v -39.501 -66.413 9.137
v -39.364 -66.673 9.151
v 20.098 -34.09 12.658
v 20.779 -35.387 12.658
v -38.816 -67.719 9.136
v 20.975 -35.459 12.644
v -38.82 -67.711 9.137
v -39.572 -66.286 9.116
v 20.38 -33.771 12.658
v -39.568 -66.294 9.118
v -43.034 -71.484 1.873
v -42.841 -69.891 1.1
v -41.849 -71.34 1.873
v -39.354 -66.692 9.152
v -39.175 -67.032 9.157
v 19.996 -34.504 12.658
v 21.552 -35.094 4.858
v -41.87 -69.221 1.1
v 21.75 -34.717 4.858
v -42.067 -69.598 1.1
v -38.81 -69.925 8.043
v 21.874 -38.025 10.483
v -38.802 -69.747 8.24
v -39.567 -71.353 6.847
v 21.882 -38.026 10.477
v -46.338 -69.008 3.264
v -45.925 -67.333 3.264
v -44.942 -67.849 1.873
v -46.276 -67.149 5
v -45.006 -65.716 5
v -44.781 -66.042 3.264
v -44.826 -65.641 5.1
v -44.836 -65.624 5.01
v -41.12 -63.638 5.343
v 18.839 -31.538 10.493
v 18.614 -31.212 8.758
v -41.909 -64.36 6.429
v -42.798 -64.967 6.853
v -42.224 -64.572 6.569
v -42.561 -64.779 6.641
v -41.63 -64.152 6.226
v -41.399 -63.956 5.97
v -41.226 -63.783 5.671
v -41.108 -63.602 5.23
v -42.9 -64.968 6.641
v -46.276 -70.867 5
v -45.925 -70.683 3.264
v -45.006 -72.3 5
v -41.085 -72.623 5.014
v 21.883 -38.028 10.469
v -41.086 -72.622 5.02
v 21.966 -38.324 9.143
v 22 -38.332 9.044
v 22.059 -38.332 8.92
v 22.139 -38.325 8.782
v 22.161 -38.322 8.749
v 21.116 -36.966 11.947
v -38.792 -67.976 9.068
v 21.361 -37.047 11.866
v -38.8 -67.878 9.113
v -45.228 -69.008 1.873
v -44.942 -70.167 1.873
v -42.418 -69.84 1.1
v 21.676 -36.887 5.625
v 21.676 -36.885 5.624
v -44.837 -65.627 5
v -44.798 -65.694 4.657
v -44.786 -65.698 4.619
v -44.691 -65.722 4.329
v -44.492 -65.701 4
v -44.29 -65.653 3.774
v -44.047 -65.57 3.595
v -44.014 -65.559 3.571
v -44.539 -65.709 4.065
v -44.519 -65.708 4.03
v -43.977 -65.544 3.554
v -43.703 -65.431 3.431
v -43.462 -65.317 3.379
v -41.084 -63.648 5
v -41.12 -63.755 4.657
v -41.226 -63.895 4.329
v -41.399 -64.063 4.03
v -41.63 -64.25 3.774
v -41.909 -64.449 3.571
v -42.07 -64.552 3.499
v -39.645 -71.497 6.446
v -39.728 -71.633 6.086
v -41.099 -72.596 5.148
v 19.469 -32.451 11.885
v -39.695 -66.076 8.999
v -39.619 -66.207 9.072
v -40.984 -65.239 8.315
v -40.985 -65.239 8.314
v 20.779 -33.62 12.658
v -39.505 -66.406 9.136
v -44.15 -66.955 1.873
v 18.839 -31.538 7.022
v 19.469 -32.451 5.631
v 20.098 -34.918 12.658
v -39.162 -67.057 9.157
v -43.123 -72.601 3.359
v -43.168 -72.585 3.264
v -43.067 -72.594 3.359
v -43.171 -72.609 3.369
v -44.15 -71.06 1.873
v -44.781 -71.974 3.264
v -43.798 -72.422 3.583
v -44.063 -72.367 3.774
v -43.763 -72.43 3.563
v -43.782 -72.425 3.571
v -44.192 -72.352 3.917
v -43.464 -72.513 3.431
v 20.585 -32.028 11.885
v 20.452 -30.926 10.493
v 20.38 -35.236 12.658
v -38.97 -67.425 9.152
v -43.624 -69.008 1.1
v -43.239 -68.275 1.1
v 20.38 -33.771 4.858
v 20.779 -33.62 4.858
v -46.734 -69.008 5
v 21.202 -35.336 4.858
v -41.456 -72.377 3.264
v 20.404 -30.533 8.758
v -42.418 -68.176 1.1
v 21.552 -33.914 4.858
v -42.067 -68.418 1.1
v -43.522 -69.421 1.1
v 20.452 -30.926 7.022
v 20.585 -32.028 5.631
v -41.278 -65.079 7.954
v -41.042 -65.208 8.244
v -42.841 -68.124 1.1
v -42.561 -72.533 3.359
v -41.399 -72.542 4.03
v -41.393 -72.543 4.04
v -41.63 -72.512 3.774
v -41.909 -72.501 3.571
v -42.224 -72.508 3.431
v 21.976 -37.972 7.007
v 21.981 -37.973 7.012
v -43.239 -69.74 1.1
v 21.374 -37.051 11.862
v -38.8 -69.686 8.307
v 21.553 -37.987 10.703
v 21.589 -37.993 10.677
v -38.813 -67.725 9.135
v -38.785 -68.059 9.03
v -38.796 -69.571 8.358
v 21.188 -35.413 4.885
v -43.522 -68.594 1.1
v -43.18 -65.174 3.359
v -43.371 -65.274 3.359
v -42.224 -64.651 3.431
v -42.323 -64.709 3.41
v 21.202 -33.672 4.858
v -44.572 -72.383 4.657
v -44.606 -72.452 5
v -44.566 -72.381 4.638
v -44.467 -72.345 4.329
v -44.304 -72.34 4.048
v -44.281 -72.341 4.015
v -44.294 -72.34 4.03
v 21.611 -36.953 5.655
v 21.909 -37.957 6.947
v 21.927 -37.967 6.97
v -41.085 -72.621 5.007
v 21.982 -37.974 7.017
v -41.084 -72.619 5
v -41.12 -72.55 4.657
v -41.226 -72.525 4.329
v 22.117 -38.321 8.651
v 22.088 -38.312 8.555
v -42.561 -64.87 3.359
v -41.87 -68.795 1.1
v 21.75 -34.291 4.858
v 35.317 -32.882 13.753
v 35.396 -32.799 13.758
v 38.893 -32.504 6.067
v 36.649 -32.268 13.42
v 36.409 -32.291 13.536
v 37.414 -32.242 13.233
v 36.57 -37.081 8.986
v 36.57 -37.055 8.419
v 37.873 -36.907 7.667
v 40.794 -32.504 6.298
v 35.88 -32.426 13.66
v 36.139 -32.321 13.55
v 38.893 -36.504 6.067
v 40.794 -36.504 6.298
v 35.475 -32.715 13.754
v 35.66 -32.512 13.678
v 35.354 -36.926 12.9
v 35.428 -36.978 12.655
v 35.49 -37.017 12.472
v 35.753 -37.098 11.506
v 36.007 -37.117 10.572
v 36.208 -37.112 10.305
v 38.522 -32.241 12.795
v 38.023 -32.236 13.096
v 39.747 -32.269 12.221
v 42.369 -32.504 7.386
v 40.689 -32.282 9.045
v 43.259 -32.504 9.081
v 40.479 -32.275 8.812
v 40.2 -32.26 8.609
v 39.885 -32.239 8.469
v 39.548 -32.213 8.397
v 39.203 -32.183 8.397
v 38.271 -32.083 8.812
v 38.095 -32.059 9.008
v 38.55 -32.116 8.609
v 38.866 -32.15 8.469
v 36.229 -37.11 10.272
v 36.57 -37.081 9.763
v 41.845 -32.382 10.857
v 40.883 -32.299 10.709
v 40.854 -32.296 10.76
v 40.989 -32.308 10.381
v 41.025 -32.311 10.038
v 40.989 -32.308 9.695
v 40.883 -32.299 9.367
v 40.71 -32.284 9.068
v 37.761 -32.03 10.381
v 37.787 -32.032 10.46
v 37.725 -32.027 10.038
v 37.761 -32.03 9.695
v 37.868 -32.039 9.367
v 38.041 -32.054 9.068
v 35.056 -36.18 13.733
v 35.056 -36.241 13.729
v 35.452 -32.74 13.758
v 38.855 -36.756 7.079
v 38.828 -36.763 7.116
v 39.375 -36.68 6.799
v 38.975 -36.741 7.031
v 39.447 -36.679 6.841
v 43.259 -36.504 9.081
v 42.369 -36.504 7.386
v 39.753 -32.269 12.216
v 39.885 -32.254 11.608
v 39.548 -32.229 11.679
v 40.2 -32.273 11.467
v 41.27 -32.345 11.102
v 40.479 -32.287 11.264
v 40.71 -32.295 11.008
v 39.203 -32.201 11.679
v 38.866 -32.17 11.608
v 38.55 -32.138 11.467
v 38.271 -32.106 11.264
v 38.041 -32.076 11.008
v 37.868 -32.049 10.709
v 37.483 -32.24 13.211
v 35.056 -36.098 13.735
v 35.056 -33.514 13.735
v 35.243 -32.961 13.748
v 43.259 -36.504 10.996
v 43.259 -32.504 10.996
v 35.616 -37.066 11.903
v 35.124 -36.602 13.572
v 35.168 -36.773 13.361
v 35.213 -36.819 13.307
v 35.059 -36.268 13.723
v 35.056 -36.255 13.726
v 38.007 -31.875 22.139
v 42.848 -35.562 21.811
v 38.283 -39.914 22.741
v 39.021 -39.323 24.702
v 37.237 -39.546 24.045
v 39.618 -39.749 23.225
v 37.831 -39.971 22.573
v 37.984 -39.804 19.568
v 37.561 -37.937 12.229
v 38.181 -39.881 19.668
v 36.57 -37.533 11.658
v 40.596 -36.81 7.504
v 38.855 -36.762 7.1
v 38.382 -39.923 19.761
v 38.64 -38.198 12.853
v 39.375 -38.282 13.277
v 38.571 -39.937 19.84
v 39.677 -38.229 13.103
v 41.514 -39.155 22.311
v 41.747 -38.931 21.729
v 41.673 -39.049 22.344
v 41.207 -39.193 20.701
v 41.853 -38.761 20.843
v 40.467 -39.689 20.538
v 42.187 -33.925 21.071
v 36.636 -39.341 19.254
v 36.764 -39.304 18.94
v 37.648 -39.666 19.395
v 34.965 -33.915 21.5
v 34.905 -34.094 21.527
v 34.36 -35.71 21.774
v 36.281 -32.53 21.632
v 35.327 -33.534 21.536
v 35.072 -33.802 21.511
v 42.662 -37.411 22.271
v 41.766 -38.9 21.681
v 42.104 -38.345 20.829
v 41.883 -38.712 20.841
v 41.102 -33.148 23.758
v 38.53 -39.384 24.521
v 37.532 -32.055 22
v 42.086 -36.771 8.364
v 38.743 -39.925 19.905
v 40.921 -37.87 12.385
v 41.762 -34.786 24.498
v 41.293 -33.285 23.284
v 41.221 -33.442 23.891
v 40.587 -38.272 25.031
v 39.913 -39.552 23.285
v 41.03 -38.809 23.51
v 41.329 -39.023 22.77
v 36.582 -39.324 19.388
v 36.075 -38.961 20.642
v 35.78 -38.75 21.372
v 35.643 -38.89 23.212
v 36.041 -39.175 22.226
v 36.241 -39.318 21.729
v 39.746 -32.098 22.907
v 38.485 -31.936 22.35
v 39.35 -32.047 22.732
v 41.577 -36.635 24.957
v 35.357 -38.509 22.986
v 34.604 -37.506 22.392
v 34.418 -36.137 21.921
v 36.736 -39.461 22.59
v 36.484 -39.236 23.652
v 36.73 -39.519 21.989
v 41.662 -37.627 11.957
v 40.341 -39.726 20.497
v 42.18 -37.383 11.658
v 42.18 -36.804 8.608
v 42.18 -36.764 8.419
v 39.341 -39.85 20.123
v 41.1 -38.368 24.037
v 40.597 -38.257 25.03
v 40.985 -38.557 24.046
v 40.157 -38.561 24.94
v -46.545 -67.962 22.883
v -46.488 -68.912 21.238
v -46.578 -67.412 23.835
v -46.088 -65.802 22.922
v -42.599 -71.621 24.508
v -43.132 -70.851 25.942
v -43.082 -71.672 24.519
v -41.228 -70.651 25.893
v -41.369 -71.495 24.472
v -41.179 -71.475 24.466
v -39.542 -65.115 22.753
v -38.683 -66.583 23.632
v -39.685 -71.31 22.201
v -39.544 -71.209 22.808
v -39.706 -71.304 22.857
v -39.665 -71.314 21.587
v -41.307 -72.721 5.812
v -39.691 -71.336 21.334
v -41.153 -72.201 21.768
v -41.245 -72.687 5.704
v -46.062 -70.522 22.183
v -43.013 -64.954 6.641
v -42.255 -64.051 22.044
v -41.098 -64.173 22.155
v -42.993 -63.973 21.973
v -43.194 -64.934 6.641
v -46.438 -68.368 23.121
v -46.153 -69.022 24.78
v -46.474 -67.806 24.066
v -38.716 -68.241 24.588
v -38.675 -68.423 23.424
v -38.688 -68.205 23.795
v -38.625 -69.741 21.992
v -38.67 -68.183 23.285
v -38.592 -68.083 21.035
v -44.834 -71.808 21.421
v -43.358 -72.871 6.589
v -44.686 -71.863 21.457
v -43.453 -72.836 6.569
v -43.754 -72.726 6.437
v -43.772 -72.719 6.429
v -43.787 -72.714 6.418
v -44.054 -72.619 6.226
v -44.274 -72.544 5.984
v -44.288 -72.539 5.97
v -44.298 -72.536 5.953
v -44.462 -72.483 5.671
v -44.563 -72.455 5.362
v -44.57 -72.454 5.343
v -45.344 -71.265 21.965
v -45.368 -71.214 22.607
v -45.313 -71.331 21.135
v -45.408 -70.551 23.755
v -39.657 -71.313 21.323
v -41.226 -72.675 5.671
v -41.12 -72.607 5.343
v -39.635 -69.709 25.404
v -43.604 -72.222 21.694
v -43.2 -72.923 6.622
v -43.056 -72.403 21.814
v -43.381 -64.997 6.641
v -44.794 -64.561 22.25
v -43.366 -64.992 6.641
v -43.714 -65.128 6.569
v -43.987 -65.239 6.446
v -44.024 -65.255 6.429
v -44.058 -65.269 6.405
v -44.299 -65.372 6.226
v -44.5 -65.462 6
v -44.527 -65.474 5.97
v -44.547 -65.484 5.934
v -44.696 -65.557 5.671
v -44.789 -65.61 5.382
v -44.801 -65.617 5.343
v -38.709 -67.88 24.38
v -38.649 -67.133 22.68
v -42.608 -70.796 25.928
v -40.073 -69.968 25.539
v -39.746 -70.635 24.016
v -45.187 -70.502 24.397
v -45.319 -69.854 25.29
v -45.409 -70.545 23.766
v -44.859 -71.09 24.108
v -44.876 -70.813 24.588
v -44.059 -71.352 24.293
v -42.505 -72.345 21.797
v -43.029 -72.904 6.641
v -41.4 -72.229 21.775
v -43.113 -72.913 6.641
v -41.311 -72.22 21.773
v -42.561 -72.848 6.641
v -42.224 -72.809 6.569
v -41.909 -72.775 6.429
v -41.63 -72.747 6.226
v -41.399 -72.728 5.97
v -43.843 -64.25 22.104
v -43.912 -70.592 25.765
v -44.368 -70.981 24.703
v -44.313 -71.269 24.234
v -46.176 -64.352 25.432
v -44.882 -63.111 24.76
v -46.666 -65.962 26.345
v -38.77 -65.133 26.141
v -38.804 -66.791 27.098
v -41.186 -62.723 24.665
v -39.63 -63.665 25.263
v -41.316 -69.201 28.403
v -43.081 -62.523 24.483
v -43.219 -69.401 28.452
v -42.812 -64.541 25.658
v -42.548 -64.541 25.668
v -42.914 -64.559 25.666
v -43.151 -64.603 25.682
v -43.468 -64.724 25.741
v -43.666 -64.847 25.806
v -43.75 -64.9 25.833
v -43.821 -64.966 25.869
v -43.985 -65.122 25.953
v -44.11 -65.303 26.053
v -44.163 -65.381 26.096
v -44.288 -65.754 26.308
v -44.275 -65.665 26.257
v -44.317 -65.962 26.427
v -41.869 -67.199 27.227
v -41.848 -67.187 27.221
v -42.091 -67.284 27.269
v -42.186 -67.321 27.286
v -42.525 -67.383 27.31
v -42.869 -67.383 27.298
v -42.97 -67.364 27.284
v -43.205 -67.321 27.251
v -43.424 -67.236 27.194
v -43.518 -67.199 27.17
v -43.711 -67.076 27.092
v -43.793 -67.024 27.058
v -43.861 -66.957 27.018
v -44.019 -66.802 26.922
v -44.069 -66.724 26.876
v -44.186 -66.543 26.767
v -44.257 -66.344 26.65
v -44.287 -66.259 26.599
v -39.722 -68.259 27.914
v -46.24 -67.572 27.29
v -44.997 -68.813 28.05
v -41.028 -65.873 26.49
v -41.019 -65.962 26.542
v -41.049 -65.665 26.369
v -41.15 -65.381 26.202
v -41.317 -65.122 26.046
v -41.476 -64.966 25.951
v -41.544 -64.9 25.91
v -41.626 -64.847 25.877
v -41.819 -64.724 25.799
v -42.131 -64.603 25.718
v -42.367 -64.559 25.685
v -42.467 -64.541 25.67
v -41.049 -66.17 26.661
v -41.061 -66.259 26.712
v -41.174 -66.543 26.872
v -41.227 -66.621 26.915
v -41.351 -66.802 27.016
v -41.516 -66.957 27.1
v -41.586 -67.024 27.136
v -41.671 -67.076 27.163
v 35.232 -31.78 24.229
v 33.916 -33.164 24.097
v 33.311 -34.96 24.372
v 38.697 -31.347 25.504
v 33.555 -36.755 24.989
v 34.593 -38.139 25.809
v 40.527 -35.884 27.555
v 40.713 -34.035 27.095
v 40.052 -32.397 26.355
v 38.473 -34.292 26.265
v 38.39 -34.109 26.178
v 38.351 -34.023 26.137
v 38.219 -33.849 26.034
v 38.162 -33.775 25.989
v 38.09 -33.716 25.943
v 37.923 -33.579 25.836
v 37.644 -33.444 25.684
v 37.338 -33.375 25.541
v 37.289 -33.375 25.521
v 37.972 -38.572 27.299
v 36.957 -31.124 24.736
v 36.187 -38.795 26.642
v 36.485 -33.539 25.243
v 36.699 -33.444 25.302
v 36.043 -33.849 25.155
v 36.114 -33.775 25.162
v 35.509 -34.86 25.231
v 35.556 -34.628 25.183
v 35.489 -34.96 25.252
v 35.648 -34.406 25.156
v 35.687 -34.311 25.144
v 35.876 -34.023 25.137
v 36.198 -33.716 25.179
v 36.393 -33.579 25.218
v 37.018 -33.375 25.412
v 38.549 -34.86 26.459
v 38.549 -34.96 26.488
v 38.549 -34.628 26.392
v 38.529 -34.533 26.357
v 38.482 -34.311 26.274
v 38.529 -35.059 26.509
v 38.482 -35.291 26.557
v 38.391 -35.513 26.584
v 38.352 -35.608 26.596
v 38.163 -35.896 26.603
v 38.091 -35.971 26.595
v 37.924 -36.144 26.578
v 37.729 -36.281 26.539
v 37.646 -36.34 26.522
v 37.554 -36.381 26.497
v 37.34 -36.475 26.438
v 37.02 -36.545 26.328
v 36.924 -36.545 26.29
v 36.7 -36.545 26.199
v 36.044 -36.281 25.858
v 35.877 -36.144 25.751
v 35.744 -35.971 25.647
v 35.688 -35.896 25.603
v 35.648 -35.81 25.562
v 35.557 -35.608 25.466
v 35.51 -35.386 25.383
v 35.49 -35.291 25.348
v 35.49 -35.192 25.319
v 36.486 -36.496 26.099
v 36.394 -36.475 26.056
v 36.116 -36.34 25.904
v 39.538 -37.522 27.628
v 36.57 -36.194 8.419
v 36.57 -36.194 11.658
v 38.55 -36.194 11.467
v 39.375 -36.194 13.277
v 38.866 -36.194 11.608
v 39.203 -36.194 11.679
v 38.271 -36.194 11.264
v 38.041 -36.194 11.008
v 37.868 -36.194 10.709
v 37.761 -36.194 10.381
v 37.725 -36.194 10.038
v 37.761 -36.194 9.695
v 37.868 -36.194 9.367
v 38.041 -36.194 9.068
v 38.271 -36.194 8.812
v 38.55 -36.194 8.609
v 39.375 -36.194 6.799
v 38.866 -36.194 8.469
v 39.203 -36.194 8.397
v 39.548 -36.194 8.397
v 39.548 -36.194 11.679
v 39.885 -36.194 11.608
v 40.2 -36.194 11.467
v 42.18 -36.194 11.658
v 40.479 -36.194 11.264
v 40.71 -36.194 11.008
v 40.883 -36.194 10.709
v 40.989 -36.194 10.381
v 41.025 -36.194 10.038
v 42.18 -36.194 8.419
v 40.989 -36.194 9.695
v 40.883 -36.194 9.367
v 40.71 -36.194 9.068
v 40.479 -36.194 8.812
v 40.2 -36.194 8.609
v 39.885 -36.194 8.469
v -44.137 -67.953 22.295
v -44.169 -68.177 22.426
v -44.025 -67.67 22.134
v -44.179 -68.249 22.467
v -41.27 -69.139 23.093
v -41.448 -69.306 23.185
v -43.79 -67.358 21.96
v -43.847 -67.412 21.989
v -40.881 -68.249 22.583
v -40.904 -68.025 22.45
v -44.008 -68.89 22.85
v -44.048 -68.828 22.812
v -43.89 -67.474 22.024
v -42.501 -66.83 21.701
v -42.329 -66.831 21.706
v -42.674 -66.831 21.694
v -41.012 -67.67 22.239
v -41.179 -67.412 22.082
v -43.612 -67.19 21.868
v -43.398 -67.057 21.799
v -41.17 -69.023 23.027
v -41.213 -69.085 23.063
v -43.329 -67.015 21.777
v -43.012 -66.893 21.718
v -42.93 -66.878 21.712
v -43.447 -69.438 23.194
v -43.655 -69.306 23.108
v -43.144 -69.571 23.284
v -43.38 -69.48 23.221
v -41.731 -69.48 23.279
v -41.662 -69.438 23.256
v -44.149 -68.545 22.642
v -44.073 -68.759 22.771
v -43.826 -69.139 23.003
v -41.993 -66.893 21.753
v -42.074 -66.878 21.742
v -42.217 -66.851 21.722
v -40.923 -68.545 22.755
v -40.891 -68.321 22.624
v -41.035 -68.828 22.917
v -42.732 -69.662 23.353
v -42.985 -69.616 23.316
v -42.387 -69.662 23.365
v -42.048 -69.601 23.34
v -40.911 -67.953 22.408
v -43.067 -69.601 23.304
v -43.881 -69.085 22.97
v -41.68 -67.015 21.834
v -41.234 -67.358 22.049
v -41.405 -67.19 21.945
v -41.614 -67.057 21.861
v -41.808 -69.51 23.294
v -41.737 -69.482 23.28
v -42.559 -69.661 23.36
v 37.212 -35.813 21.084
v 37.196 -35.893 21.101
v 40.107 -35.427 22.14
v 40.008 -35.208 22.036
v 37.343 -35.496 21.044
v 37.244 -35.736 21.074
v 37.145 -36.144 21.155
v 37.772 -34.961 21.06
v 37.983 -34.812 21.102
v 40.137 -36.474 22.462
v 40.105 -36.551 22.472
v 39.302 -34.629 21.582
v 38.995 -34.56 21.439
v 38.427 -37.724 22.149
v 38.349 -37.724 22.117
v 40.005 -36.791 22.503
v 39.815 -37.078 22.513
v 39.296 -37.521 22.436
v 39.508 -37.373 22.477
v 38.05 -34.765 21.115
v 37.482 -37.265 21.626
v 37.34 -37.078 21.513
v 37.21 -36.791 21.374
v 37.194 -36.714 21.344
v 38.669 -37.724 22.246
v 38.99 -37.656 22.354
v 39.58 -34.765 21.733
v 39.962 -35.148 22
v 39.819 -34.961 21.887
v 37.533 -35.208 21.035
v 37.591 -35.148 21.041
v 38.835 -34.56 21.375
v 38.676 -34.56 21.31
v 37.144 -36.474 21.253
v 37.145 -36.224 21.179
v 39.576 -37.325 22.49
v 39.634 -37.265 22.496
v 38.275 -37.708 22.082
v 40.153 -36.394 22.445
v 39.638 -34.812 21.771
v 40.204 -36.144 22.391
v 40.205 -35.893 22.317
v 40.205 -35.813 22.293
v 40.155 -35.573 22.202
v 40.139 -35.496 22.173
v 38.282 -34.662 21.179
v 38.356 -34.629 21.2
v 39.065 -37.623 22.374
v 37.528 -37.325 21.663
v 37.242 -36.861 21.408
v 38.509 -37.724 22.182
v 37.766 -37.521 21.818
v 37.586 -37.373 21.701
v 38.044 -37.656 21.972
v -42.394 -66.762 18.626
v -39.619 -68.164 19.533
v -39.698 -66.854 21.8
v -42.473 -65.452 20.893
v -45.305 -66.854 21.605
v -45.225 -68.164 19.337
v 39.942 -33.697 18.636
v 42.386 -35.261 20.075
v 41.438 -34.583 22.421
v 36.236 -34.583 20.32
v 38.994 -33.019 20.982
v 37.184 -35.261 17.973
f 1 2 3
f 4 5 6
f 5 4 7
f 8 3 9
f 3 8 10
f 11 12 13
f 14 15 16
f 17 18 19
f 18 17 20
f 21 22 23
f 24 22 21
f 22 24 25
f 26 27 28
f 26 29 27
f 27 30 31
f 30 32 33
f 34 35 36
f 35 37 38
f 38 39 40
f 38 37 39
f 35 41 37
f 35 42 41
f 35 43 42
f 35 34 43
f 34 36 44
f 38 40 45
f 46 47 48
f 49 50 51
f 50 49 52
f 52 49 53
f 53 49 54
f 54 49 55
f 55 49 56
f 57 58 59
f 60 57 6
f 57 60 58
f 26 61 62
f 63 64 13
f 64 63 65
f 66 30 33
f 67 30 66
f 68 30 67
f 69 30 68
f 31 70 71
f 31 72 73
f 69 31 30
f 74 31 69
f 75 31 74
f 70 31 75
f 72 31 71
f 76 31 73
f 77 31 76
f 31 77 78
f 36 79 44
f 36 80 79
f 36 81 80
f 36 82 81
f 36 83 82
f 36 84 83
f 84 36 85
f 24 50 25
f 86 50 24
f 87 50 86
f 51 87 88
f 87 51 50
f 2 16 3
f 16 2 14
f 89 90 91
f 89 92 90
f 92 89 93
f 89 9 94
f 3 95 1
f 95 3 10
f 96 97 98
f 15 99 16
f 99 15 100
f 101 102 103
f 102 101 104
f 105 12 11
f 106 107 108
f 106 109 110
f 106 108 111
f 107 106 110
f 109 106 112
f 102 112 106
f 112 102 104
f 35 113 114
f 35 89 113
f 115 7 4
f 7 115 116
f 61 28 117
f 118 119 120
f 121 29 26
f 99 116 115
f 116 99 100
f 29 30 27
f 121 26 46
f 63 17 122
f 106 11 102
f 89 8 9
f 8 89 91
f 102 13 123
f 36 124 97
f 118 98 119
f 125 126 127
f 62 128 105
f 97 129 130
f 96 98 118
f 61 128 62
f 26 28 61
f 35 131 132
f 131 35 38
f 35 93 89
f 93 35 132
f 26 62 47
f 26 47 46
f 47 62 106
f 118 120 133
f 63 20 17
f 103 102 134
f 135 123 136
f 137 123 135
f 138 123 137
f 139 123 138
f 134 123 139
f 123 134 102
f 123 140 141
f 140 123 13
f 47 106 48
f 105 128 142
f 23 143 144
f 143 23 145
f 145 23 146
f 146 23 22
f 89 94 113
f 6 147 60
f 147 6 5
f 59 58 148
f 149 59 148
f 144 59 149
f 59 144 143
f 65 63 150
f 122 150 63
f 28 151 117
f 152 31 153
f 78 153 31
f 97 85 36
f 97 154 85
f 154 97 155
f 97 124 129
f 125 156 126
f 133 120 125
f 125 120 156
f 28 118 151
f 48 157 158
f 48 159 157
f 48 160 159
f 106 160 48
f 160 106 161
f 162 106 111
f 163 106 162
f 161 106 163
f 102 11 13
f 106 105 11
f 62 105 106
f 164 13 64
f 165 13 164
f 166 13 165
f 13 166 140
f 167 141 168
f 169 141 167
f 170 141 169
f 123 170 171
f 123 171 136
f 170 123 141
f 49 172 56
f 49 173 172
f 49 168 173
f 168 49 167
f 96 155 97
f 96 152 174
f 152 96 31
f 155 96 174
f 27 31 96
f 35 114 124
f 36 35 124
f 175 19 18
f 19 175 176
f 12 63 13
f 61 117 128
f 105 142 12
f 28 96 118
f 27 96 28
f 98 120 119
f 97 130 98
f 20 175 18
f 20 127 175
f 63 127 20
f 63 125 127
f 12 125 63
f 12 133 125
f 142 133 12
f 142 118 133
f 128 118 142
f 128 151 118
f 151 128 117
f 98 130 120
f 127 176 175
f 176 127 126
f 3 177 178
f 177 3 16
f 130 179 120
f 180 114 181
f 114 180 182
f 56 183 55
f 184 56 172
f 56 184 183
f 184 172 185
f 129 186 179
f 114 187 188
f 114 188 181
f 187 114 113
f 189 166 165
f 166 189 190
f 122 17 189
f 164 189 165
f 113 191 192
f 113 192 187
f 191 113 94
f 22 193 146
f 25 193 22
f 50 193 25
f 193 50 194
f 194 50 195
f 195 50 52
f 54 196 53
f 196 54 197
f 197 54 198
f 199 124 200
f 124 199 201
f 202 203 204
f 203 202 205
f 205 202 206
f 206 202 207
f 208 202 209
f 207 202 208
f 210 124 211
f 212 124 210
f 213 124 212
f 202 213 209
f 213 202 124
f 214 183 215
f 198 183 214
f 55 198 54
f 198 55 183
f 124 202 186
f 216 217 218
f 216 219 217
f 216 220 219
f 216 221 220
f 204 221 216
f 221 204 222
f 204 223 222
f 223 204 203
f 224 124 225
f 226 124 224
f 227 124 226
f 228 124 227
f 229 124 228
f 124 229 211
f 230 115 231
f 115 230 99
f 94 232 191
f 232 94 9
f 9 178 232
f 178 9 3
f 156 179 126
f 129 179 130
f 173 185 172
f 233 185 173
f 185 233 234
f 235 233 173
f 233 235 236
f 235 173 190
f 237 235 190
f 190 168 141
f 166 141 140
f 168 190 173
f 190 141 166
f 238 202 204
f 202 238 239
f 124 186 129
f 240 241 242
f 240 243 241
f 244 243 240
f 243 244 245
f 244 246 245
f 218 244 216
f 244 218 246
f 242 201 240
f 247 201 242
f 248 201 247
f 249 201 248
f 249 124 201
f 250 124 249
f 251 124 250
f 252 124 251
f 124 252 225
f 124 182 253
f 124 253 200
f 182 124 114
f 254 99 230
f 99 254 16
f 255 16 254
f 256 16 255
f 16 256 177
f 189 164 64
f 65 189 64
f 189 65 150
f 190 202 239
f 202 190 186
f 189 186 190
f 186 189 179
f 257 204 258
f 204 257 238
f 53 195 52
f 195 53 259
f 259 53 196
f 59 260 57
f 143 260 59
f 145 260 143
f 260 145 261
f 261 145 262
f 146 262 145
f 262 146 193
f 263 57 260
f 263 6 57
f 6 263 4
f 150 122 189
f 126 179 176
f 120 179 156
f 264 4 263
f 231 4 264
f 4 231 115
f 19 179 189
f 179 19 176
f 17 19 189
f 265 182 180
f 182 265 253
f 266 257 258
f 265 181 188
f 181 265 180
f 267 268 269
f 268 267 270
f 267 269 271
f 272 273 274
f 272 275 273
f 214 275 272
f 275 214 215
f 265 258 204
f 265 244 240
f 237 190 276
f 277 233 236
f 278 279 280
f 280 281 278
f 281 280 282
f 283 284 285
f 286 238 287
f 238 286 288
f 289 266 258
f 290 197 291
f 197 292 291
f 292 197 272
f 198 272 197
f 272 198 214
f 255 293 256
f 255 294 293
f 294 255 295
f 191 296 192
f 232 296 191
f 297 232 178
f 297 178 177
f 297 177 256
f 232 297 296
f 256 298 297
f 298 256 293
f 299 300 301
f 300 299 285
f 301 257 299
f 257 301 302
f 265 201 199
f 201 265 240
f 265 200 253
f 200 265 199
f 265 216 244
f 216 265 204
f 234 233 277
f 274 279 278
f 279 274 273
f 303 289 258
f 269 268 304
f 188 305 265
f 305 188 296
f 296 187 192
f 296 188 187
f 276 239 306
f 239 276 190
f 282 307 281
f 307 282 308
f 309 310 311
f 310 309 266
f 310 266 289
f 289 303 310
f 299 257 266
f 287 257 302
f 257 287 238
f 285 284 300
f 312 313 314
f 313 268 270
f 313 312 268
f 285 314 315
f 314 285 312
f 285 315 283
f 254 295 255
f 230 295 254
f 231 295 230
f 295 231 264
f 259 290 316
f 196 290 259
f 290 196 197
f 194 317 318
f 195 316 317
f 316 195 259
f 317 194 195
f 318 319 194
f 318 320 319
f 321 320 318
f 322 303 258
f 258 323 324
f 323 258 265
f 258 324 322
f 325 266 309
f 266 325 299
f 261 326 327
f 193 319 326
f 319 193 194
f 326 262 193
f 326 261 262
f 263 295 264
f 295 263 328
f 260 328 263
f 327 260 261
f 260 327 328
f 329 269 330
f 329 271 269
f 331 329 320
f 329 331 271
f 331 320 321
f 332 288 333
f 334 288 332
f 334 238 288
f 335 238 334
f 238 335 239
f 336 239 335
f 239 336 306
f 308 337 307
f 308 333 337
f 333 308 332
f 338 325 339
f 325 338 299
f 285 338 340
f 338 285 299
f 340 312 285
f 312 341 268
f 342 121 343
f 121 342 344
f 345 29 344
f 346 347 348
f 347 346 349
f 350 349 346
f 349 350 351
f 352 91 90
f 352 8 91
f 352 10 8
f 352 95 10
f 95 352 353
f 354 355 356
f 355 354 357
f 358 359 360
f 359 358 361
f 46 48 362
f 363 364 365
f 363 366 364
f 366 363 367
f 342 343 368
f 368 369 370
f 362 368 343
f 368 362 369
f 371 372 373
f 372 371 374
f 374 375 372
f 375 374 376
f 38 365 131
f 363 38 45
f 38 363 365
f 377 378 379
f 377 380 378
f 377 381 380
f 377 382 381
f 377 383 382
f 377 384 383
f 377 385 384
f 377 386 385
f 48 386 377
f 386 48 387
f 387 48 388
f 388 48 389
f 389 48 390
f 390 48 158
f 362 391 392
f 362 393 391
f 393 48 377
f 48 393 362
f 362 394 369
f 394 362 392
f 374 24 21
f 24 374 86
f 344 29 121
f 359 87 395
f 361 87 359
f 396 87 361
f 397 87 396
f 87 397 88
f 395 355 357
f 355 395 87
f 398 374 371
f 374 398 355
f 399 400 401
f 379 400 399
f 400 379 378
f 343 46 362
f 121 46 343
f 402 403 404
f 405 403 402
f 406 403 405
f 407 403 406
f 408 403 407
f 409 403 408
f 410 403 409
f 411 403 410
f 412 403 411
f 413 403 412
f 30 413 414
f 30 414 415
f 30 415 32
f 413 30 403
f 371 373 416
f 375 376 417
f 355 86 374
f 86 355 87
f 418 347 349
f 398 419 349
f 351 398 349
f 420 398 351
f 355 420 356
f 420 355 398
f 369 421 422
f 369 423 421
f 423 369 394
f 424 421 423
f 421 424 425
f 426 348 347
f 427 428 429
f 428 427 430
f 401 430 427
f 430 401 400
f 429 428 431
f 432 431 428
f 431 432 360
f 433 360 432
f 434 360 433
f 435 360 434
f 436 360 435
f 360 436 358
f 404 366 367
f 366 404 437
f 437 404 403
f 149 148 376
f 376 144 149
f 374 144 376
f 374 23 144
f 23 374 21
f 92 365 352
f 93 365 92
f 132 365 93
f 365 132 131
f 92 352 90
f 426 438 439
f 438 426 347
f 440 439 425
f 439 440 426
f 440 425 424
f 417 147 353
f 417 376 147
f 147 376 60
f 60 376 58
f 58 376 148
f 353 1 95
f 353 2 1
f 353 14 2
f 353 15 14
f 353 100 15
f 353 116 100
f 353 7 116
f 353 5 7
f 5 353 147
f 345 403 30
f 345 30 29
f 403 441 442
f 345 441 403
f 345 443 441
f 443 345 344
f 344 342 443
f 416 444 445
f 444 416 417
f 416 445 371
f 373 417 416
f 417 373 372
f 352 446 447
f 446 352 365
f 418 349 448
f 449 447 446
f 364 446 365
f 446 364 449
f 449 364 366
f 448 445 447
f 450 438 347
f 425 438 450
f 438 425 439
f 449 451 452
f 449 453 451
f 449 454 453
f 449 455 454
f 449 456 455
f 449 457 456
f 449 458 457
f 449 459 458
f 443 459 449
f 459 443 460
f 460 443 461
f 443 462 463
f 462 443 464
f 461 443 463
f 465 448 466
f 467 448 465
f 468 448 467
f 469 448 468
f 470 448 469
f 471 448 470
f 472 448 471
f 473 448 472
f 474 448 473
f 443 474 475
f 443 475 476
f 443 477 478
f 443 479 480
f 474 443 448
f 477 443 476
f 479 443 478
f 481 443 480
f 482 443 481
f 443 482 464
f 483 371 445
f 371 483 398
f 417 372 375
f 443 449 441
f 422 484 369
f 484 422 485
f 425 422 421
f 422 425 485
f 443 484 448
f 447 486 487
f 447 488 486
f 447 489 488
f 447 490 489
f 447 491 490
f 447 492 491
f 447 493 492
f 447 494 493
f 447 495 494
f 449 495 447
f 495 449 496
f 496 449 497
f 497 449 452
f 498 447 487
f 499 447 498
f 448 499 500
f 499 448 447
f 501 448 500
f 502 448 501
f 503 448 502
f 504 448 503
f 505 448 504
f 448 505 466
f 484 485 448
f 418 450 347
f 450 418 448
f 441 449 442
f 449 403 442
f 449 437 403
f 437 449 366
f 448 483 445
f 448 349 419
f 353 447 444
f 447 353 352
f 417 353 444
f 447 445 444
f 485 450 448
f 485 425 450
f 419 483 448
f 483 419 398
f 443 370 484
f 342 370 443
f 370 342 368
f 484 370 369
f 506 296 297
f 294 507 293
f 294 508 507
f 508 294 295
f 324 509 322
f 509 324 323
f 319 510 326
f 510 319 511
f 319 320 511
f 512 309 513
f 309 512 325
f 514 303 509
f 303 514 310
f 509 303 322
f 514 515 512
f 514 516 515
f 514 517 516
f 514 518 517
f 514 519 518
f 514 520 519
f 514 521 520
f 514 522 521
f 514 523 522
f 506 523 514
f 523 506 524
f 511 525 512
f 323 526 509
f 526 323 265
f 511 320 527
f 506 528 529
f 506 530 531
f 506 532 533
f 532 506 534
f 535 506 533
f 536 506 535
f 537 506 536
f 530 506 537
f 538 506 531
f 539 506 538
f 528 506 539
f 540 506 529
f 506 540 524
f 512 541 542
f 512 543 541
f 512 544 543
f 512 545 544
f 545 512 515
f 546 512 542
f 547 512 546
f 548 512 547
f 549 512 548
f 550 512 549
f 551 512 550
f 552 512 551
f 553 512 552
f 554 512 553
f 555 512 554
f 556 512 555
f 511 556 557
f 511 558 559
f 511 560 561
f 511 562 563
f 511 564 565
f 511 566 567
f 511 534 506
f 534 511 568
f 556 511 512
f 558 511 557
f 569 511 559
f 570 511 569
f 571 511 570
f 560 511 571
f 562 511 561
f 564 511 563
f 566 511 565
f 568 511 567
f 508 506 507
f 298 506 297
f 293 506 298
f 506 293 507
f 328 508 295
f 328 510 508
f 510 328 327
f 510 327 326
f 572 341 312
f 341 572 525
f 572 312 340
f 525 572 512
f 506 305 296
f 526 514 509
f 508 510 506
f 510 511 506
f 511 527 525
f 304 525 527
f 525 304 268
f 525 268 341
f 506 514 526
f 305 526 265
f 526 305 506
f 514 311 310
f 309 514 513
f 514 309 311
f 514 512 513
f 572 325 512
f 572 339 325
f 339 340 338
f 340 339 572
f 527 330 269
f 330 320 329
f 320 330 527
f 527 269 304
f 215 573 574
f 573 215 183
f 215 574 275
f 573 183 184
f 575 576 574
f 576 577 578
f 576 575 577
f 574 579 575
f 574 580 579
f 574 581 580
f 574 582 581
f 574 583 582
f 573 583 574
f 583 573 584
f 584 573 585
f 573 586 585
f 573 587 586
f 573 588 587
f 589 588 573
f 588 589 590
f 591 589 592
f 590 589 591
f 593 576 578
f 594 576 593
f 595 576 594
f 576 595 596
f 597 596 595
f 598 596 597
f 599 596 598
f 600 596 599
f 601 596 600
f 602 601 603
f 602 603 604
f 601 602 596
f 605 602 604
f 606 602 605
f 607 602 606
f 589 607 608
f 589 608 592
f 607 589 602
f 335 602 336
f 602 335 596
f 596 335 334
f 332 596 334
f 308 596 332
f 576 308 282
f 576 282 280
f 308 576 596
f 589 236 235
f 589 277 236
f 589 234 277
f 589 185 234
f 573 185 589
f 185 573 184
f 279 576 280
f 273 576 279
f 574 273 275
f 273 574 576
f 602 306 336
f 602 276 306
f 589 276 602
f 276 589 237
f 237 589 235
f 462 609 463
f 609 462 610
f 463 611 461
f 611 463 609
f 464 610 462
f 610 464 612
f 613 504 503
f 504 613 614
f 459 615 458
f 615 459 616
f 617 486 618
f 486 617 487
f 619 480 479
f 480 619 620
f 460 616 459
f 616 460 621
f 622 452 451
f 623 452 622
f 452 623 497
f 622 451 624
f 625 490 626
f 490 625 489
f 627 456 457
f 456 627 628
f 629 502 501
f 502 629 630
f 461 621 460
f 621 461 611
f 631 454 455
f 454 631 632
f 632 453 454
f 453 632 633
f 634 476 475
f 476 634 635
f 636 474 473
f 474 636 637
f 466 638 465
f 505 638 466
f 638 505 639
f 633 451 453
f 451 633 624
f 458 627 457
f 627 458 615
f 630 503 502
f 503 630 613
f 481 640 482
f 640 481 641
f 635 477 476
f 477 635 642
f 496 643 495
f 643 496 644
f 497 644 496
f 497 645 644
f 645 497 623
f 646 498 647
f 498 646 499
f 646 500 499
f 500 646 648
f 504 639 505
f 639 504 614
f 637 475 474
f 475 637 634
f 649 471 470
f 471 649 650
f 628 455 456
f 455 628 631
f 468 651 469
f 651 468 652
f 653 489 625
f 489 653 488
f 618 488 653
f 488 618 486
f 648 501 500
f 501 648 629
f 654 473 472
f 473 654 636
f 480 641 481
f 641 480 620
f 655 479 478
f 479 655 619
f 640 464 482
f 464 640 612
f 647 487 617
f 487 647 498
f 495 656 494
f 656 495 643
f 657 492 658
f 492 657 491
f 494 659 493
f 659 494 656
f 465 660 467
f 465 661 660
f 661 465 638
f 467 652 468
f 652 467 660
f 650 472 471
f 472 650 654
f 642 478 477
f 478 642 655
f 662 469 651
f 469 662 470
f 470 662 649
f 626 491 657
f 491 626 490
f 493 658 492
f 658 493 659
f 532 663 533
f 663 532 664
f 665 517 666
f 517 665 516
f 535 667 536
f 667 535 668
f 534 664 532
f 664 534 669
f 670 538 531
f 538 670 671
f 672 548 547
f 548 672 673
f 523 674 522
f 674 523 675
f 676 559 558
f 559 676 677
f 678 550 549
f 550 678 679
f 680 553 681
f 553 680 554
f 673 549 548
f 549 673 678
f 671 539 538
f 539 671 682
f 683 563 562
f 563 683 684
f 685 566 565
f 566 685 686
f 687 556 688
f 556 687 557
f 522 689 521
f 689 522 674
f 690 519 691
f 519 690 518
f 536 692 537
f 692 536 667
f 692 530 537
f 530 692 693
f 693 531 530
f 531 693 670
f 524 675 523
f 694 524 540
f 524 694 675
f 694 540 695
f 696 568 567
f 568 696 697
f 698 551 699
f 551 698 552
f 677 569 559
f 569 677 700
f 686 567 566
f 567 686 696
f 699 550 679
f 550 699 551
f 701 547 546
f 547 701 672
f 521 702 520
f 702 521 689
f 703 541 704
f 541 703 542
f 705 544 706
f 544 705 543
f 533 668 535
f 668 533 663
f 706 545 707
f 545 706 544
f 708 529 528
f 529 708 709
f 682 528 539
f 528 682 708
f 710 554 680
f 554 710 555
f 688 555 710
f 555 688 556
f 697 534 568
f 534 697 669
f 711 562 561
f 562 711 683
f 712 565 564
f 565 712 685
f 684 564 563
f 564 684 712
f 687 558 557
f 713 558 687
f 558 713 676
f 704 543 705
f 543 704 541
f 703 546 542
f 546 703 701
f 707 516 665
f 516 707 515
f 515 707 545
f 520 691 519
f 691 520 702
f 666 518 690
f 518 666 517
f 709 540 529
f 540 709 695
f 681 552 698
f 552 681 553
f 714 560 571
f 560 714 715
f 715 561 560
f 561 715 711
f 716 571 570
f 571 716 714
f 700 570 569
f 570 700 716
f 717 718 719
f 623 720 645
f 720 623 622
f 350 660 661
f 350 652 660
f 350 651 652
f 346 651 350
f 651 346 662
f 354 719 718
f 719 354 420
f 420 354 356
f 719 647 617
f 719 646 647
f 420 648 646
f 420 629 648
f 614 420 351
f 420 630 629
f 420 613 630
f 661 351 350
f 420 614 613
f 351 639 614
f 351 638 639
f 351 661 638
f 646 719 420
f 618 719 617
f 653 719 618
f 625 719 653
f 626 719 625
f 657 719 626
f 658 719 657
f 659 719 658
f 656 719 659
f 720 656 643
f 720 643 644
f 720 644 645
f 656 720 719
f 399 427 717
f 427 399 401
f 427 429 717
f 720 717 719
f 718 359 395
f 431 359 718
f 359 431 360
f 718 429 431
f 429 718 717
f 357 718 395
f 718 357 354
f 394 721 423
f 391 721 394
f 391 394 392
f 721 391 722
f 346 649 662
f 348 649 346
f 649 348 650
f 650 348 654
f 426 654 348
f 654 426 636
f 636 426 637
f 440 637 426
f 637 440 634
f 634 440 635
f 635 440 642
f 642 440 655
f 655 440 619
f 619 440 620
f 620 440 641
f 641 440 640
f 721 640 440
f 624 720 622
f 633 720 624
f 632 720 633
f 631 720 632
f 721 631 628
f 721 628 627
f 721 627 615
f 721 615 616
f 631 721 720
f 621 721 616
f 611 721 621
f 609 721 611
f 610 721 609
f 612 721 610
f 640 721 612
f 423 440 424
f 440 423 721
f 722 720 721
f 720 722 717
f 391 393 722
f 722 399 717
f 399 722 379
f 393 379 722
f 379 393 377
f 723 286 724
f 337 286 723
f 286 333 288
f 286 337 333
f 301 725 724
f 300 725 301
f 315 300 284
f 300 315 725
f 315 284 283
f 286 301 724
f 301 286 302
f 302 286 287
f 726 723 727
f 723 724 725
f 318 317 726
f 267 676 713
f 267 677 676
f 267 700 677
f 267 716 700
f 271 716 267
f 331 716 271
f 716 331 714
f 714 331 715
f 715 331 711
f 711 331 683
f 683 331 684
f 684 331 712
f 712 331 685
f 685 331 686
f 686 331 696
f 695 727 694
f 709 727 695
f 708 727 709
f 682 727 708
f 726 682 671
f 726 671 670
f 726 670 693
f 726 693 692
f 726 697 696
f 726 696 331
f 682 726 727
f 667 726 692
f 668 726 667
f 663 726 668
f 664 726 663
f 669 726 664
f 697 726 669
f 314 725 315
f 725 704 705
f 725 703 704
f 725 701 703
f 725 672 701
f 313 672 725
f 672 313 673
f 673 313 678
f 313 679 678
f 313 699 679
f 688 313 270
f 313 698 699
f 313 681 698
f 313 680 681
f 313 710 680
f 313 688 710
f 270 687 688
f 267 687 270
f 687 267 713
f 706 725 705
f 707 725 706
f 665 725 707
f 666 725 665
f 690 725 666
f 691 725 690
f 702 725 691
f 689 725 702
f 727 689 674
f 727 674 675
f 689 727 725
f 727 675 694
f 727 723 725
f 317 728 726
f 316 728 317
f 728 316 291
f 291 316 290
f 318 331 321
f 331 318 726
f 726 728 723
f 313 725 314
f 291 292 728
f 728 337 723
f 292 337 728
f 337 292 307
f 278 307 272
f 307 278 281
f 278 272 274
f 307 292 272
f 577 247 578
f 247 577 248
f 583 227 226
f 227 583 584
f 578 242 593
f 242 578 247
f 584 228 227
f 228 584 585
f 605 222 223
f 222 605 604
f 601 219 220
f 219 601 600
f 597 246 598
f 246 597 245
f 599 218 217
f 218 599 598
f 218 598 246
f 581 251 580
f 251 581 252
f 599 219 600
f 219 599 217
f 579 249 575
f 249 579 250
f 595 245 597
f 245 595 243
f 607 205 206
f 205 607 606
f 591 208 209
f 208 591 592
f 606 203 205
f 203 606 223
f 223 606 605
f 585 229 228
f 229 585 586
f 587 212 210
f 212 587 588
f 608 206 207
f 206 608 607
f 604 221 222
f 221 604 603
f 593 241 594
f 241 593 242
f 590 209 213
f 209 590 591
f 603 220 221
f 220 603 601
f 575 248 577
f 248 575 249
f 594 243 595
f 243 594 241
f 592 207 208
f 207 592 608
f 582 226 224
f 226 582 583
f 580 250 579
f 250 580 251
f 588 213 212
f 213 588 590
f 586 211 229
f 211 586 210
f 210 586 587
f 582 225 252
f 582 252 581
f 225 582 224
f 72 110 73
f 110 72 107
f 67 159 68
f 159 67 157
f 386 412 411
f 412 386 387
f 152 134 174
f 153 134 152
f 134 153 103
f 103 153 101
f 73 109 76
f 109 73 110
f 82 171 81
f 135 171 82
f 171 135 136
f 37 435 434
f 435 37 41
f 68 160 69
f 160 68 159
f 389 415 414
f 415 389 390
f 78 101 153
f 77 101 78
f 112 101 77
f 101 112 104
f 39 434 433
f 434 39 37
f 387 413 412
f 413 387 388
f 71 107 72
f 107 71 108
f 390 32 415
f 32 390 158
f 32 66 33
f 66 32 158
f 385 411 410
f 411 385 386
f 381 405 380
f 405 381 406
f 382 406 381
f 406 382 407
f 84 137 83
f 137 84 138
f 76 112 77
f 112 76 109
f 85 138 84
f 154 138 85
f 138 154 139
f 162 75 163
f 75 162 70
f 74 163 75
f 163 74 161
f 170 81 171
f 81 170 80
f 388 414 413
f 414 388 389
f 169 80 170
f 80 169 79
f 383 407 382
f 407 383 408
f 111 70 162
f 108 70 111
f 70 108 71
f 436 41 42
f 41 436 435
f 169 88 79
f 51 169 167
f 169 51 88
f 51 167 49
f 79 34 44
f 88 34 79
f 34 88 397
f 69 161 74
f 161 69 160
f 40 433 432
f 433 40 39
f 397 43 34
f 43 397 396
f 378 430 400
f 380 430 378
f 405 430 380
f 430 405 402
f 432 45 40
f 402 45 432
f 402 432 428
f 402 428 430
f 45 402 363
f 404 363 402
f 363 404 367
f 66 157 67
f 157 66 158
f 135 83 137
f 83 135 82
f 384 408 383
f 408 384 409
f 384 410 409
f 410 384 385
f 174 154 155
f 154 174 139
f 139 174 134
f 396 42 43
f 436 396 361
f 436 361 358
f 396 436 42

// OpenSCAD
mirror ([-1, 0, 0]) {
  difference () {
    union () {
      hull () {
        translate ([42.73373313209089, -69.0078112269751, 5.0]) {
          sphere (r=4);
        }
        translate ([0, 0, 8]) {
          rotate (a=12.0, v=[0, 1, 0]) {
            translate ([0, -12, 5.64]) {
              translate ([0, 0, 236.2124823694608]) {
                rotate (a=-10.0, v=[0, 1, 0]) {
                  translate ([0, 0, -236.2124823694608]) {
                    translate ([0, 0, 84.31095110414394]) {
                      rotate (a=-29.999999999999996, v=[1, 0, 0]) {
                        translate ([0, 0, -84.31095110414394]) {
                          translate ([0, 0, -4.5]) {
                            translate ([0, -13.575, 0]) {
                              cylinder (h=3, r=4, center=true);
                            }
                          }
                        }
                      }
                    }
                  }
                }
              }
            }
          }
        }
      }
      translate ([0, 0, 8]) {
        rotate (a=12.0, v=[0, 1, 0]) {
          translate ([0, -12, 5.64]) {
            translate ([0, 0, 236.2124823694608]) {
              rotate (a=-10.0, v=[0, 1, 0]) {
                translate ([0, 0, -236.2124823694608]) {
                  translate ([0, 0, 84.31095110414394]) {
                    rotate (a=-29.999999999999996, v=[1, 0, 0]) {
                      translate ([0, 0, -84.31095110414394]) {
                        translate ([0, 0, -2.0999999999999996]) {
                          translate ([0, -13.575, 0]) {
                            cylinder (h=4, r=4, center=true);
                          }
                        }
                      }
                    }
                  }
                }
              }
            }
          }
        }
      }
      
      union () {
        hull () {
          translate ([42.73373313209089, -69.0078112269751, 5.0]) {
            sphere (r=4);
          }
          translate ([-20.8861121541338, -34.50390561348755, 8.757888382012283]) {
            sphere (r=4);
          }
        }
        hull () {
          translate ([-20.8861121541338, -34.50390561348755, 8.757888382012283]) {
            sphere (r=4);
          }
          translate ([-39.37541674104513, -34.50390561348755, 10.038272992958468]) {
            rotate (a=90.0, v=[1, 0, 0]) {
              cylinder (h=4, r=4, center=true);
            }
          }
        }
        hull () {
          translate ([-39.37541674104513, -34.50390561348755, 10.038272992958468]) {
            rotate (a=90.0, v=[1, 0, 0]) {
              cylinder (h=4, r=4, center=true);
            }
          }
          translate ([0, 0, 8]) {
            rotate (a=12.0, v=[0, 1, 0]) {
              translate ([0, 0, 0]) {
                translate ([0, 0, 236.2124823694608]) {
                  rotate (a=10.0, v=[0, 1, 0]) {
                    translate ([0, 0, -236.2124823694608]) {
                      translate ([0, 0, 84.31095110414394]) {
                        rotate (a=-14.999999999999998, v=[1, 0, 0]) {
                          translate ([0, 0, -84.31095110414394]) {
                            translate ([0, 0, -4.5]) {
                              translate ([0, -13.575, 0]) {
                                cylinder (h=3, r=4, center=true);
                              }
                            }
                          }
                        }
                      }
                    }
                  }
                }
              }
            }
          }
        }
      }
      translate ([0, 0, 8]) {
        rotate (a=12.0, v=[0, 1, 0]) {
          translate ([0, 0, 0]) {
            translate ([0, 0, 236.2124823694608]) {
              rotate (a=10.0, v=[0, 1, 0]) {
                translate ([0, 0, -236.2124823694608]) {
                  translate ([0, 0, 84.31095110414394]) {
                    rotate (a=-14.999999999999998, v=[1, 0, 0]) {
                      translate ([0, 0, -84.31095110414394]) {
                        translate ([0, 0, -2.0999999999999996]) {
                          translate ([0, -13.575, 0]) {
                            cylinder (h=4, r=4, center=true);
                          }
                        }
                      }
                    }
                  }
                }
              }
            }
          }
        }
      }
    }
    union () {
      translate ([0, 0, 8]) {
        rotate (a=12.0, v=[0, 1, 0]) {
          translate ([0, -12, 5.64]) {
            translate ([0, 0, 236.2124823694608]) {
              rotate (a=-10.0, v=[0, 1, 0]) {
                translate ([0, 0, -236.2124823694608]) {
                  translate ([0, 0, 84.31095110414394]) {
                    rotate (a=-29.999999999999996, v=[1, 0, 0]) {
                      translate ([0, 0, -84.31095110414394]) {
                        translate ([0, 0, -2.0999999999999996]) {
                          translate ([0, -13.575, 0]) {
                            cylinder ($fn=30, h=10, r=1.65, center=true);
                          }
                        }
                      }
                    }
                  }
                }
              }
            }
          }
        }
      }
      translate ([0, 0, 8]) {
        rotate (a=12.0, v=[0, 1, 0]) {
          translate ([0, -12, 5.64]) {
            translate ([0, 0, 236.2124823694608]) {
              rotate (a=-10.0, v=[0, 1, 0]) {
                translate ([0, 0, -236.2124823694608]) {
                  translate ([0, 0, 84.31095110414394]) {
                    rotate (a=29.999999999999996, v=[1, 0, 0]) {
                      translate ([3.8625, 0, -84.31095110414394]) {
                        translate ([0, 0, -2.0999999999999996]) {
                          translate ([0, 13.575, 0]) {
                            cylinder ($fn=30, h=10, r=1.65, center=true);
                          }
                        }
                      }
                    }
                  }
                }
              }
            }
          }
        }
      }
      translate ([0, 0, 8]) {
        rotate (a=12.0, v=[0, 1, 0]) {
          translate ([0, -2, 0]) {
            translate ([0, 0, 236.2124823694608]) {
              rotate (a=20.0, v=[0, 1, 0]) {
                translate ([0, 0, -236.2124823694608]) {
                  translate ([0, 0, 84.31095110414394]) {
                    rotate (a=29.999999999999996, v=[1, 0, 0]) {
                      translate ([0, 0, -84.31095110414394]) {
                        translate ([0, 0, -2.0999999999999996]) {
                          translate ([0, 13.575, 0]) {
                            cylinder ($fn=30, h=10, r=1.65, center=true);
                          }
                        }
                      }
                    }
                  }
                }
              }
            }
          }
        }
      }
      translate ([0, 0, 8]) {
        rotate (a=12.0, v=[0, 1, 0]) {
          translate ([0, 0, 0]) {
            translate ([0, 0, 236.2124823694608]) {
              rotate (a=10.0, v=[0, 1, 0]) {
                translate ([0, 0, -236.2124823694608]) {
                  translate ([0, 0, 84.31095110414394]) {
                    rotate (a=-14.999999999999998, v=[1, 0, 0]) {
                      translate ([0, 0, -84.31095110414394]) {
                        translate ([0, 0, -2.0999999999999996]) {
                          translate ([0, -13.575, 0]) {
                            cylinder ($fn=30, h=10, r=1.65, center=true);
                          }
                        }
                      }
                    }
                  }
                }
              }
            }
          }
        }
      }
      translate ([0, 0, 8]) {
        rotate (a=12.0, v=[0, 1, 0]) {
          translate ([0, -12, 5.64]) {
            translate ([0, 0, 236.2124823694608]) {
              rotate (a=-10.0, v=[0, 1, 0]) {
                translate ([0, 0, -236.2124823694608]) {
                  translate ([0, 0, 84.31095110414394]) {
                    rotate (a=29.999999999999996, v=[1, 0, 0]) {
                      translate ([3.8625, 0, -84.31095110414394]) {
                        hull () {
                          translate ([0, 0, -6]) {
                            translate ([0, 28.575, 0]) {
                              union () {
                                cube ([5.81, 3.3544050639917264, 2.82], center=true);
                                rotate (a=59.99999999999999, v=[0, 0, 1]) {
                                  cube ([5.81, 3.3544050639917264, 2.82], center=true);
                                }
                                rotate (a=-59.99999999999999, v=[0, 0, 1]) {
                                  cube ([5.81, 3.3544050639917264, 2.82], center=true);
                                }
                              }
                            }
                          }
                          translate ([0, 0, -6]) {
                            translate ([0, 13.575, 0]) {
                              union () {
                                cube ([5.609999999999999, 3.238935010153801, 2.6199999999999997], center=true);
                                rotate (a=59.99999999999999, v=[0, 0, 1]) {
                                  cube ([5.609999999999999, 3.238935010153801, 2.6199999999999997], center=true);
                                }
                                rotate (a=-59.99999999999999, v=[0, 0, 1]) {
                                  cube ([5.609999999999999, 3.238935010153801, 2.6199999999999997], center=true);
                                }
                              }
                            }
                          }
                        }
                      }
                    }
                  }
                }
              }
            }
          }
        }
      }
      translate ([0, 0, 8]) {
        rotate (a=12.0, v=[0, 1, 0]) {
          translate ([0, -12, 5.64]) {
            translate ([0, 0, 236.2124823694608]) {
              rotate (a=-10.0, v=[0, 1, 0]) {
                translate ([0, 0, -236.2124823694608]) {
                  translate ([0, 0, 84.31095110414394]) {
                    rotate (a=-29.999999999999996, v=[1, 0, 0]) {
                      translate ([0, 0, -84.31095110414394]) {
                        hull () {
                          translate ([0, 0, -6]) {
                            translate ([0, -28.575, 0]) {
                              union () {
                                cube ([5.81, 3.3544050639917264, 2.82], center=true);
                                rotate (a=59.99999999999999, v=[0, 0, 1]) {
                                  cube ([5.81, 3.3544050639917264, 2.82], center=true);
                                }
                                rotate (a=-59.99999999999999, v=[0, 0, 1]) {
                                  cube ([5.81, 3.3544050639917264, 2.82], center=true);
                                }
                              }
                            }
                          }
                          translate ([0, 0, -6]) {
                            translate ([0, -13.575, 0]) {
                              union () {
                                cube ([5.609999999999999, 3.238935010153801, 2.6199999999999997], center=true);
                                rotate (a=59.99999999999999, v=[0, 0, 1]) {
                                  cube ([5.609999999999999, 3.238935010153801, 2.6199999999999997], center=true);
                                }
                                rotate (a=-59.99999999999999, v=[0, 0, 1]) {
                                  cube ([5.609999999999999, 3.238935010153801, 2.6199999999999997], center=true);
                                }
                              }
                            }
                          }
                        }
                      }
                    }
                  }
                }
              }
            }
          }
        }
      }
      translate ([0, 0, 8]) {
        rotate (a=12.0, v=[0, 1, 0]) {
          translate ([0, -2, 0]) {
            translate ([0, 0, 236.2124823694608]) {
              rotate (a=20.0, v=[0, 1, 0]) {
                translate ([0, 0, -236.2124823694608]) {
                  translate ([0, 0, 84.31095110414394]) {
                    rotate (a=29.999999999999996, v=[1, 0, 0]) {
                      translate ([0, 0, -84.31095110414394]) {
                        hull () {
                          translate ([0, 0, -6]) {
                            translate ([0, 28.575, 0]) {
                              union () {
                                cube ([5.81, 3.3544050639917264, 2.82], center=true);
                                rotate (a=59.99999999999999, v=[0, 0, 1]) {
                                  cube ([5.81, 3.3544050639917264, 2.82], center=true);
                                }
                                rotate (a=-59.99999999999999, v=[0, 0, 1]) {
                                  cube ([5.81, 3.3544050639917264, 2.82], center=true);
                                }
                              }
                            }
                          }
                          translate ([0, 0, -6]) {
                            translate ([0, 13.575, 0]) {
                              union () {
                                cube ([5.609999999999999, 3.238935010153801, 2.6199999999999997], center=true);
                                rotate (a=59.99999999999999, v=[0, 0, 1]) {
                                  cube ([5.609999999999999, 3.238935010153801, 2.6199999999999997], center=true);
                                }
                                rotate (a=-59.99999999999999, v=[0, 0, 1]) {
                                  cube ([5.609999999999999, 3.238935010153801, 2.6199999999999997], center=true);
                                }
                              }
                            }
                          }
                        }
                      }
                    }
                  }
                }
              }
            }
          }
        }
      }
      translate ([0, 0, 8]) {
        rotate (a=12.0, v=[0, 1, 0]) {
          translate ([0, 0, 0]) {
            translate ([0, 0, 236.2124823694608]) {
              rotate (a=10.0, v=[0, 1, 0]) {
                translate ([0, 0, -236.2124823694608]) {
                  translate ([0, 0, 84.31095110414394]) {
                    rotate (a=-14.999999999999998, v=[1, 0, 0]) {
                      translate ([0, 0, -84.31095110414394]) {
                        hull () {
                          translate ([0, 0, -6]) {
                            translate ([0, -28.575, 0]) {
                              union () {
                                cube ([5.81, 3.3544050639917264, 2.82], center=true);
                                rotate (a=59.99999999999999, v=[0, 0, 1]) {
                                  cube ([5.81, 3.3544050639917264, 2.82], center=true);
                                }
                                rotate (a=-59.99999999999999, v=[0, 0, 1]) {
                                  cube ([5.81, 3.3544050639917264, 2.82], center=true);
                                }
                              }
                            }
                          }
                          translate ([0, 0, -6]) {
                            translate ([0, -13.575, 0]) {
                              union () {
                                cube ([5.609999999999999, 3.238935010153801, 2.6199999999999997], center=true);
                                rotate (a=59.99999999999999, v=[0, 0, 1]) {
                                  cube ([5.609999999999999, 3.238935010153801, 2.6199999999999997], center=true);
                                }
                                rotate (a=-59.99999999999999, v=[0, 0, 1]) {
                                  cube ([5.609999999999999, 3.238935010153801, 2.6199999999999997], center=true);
                                }
                              }
                            }
                          }
                        }
                      }
                    }
                  }
                }
              }
            }
          }
        }
      }
      translate ([0, 2, 0]) {
        translate ([-39.37541674104513, 45.007811226975086, 20.03827299295847]) {
          rotate (a=90.0, v=[1, 0, 0]) {
            union () {
              cube ([5.609999999999999, 3.238935010153801, 2.6199999999999997], center=true);
              rotate (a=59.99999999999999, v=[0, 0, 1]) {
                cube ([5.609999999999999, 3.238935010153801, 2.6199999999999997], center=true);
              }
              rotate (a=-59.99999999999999, v=[0, 0, 1]) {
                cube ([5.609999999999999, 3.238935010153801, 2.6199999999999997], center=true);
              }
            }
          }
        }
      }
      translate ([0, -3.0, 0]) {
        translate ([-39.37541674104513, -34.50390561348755, 10.038272992958468]) {
          rotate (a=-90.0, v=[1, 0, 0]) {
            union () {
              cube ([5.609999999999999, 3.238935010153801, 2.6199999999999997], center=true);
              rotate (a=59.99999999999999, v=[0, 0, 1]) {
                cube ([5.609999999999999, 3.238935010153801, 2.6199999999999997], center=true);
              }
              rotate (a=-59.99999999999999, v=[0, 0, 1]) {
                cube ([5.609999999999999, 3.238935010153801, 2.6199999999999997], center=true);
              }
            }
          }
        }
      }
      hull () {
        translate ([-39.37541674104513, 45.007811226975086, 20.03827299295847]) {
          rotate (a=90.0, v=[1, 0, 0]) {
            cylinder ($fn=30, h=20, r=1.65, center=true);
          }
        }
    } hull() {
        translate ([-39.37541674104513, -34.50390561348755, 10.038272992958468]) {
          rotate (a=90.0, v=[1, 0, 0]) {
            cylinder ($fn=30, h=20, r=1.65, center=true);
          }
        }
      }
      hull () {
        translate ([46.59388020145215, 45.007811226975086, 5.0]) {
          rotate (a=90.0, v=[1, 0, 0]) {
            cylinder ($fn=30, h=20, r=1.65, center=true);
          }
        }
        translate ([42.73373313209089, -69.0078112269751, 5.0]) {
          rotate (a=90.0, v=[1, 0, 0]) {
            cylinder ($fn=30, h=20, r=1.65, center=true);
          }
        }
      }
    }
  }
}
